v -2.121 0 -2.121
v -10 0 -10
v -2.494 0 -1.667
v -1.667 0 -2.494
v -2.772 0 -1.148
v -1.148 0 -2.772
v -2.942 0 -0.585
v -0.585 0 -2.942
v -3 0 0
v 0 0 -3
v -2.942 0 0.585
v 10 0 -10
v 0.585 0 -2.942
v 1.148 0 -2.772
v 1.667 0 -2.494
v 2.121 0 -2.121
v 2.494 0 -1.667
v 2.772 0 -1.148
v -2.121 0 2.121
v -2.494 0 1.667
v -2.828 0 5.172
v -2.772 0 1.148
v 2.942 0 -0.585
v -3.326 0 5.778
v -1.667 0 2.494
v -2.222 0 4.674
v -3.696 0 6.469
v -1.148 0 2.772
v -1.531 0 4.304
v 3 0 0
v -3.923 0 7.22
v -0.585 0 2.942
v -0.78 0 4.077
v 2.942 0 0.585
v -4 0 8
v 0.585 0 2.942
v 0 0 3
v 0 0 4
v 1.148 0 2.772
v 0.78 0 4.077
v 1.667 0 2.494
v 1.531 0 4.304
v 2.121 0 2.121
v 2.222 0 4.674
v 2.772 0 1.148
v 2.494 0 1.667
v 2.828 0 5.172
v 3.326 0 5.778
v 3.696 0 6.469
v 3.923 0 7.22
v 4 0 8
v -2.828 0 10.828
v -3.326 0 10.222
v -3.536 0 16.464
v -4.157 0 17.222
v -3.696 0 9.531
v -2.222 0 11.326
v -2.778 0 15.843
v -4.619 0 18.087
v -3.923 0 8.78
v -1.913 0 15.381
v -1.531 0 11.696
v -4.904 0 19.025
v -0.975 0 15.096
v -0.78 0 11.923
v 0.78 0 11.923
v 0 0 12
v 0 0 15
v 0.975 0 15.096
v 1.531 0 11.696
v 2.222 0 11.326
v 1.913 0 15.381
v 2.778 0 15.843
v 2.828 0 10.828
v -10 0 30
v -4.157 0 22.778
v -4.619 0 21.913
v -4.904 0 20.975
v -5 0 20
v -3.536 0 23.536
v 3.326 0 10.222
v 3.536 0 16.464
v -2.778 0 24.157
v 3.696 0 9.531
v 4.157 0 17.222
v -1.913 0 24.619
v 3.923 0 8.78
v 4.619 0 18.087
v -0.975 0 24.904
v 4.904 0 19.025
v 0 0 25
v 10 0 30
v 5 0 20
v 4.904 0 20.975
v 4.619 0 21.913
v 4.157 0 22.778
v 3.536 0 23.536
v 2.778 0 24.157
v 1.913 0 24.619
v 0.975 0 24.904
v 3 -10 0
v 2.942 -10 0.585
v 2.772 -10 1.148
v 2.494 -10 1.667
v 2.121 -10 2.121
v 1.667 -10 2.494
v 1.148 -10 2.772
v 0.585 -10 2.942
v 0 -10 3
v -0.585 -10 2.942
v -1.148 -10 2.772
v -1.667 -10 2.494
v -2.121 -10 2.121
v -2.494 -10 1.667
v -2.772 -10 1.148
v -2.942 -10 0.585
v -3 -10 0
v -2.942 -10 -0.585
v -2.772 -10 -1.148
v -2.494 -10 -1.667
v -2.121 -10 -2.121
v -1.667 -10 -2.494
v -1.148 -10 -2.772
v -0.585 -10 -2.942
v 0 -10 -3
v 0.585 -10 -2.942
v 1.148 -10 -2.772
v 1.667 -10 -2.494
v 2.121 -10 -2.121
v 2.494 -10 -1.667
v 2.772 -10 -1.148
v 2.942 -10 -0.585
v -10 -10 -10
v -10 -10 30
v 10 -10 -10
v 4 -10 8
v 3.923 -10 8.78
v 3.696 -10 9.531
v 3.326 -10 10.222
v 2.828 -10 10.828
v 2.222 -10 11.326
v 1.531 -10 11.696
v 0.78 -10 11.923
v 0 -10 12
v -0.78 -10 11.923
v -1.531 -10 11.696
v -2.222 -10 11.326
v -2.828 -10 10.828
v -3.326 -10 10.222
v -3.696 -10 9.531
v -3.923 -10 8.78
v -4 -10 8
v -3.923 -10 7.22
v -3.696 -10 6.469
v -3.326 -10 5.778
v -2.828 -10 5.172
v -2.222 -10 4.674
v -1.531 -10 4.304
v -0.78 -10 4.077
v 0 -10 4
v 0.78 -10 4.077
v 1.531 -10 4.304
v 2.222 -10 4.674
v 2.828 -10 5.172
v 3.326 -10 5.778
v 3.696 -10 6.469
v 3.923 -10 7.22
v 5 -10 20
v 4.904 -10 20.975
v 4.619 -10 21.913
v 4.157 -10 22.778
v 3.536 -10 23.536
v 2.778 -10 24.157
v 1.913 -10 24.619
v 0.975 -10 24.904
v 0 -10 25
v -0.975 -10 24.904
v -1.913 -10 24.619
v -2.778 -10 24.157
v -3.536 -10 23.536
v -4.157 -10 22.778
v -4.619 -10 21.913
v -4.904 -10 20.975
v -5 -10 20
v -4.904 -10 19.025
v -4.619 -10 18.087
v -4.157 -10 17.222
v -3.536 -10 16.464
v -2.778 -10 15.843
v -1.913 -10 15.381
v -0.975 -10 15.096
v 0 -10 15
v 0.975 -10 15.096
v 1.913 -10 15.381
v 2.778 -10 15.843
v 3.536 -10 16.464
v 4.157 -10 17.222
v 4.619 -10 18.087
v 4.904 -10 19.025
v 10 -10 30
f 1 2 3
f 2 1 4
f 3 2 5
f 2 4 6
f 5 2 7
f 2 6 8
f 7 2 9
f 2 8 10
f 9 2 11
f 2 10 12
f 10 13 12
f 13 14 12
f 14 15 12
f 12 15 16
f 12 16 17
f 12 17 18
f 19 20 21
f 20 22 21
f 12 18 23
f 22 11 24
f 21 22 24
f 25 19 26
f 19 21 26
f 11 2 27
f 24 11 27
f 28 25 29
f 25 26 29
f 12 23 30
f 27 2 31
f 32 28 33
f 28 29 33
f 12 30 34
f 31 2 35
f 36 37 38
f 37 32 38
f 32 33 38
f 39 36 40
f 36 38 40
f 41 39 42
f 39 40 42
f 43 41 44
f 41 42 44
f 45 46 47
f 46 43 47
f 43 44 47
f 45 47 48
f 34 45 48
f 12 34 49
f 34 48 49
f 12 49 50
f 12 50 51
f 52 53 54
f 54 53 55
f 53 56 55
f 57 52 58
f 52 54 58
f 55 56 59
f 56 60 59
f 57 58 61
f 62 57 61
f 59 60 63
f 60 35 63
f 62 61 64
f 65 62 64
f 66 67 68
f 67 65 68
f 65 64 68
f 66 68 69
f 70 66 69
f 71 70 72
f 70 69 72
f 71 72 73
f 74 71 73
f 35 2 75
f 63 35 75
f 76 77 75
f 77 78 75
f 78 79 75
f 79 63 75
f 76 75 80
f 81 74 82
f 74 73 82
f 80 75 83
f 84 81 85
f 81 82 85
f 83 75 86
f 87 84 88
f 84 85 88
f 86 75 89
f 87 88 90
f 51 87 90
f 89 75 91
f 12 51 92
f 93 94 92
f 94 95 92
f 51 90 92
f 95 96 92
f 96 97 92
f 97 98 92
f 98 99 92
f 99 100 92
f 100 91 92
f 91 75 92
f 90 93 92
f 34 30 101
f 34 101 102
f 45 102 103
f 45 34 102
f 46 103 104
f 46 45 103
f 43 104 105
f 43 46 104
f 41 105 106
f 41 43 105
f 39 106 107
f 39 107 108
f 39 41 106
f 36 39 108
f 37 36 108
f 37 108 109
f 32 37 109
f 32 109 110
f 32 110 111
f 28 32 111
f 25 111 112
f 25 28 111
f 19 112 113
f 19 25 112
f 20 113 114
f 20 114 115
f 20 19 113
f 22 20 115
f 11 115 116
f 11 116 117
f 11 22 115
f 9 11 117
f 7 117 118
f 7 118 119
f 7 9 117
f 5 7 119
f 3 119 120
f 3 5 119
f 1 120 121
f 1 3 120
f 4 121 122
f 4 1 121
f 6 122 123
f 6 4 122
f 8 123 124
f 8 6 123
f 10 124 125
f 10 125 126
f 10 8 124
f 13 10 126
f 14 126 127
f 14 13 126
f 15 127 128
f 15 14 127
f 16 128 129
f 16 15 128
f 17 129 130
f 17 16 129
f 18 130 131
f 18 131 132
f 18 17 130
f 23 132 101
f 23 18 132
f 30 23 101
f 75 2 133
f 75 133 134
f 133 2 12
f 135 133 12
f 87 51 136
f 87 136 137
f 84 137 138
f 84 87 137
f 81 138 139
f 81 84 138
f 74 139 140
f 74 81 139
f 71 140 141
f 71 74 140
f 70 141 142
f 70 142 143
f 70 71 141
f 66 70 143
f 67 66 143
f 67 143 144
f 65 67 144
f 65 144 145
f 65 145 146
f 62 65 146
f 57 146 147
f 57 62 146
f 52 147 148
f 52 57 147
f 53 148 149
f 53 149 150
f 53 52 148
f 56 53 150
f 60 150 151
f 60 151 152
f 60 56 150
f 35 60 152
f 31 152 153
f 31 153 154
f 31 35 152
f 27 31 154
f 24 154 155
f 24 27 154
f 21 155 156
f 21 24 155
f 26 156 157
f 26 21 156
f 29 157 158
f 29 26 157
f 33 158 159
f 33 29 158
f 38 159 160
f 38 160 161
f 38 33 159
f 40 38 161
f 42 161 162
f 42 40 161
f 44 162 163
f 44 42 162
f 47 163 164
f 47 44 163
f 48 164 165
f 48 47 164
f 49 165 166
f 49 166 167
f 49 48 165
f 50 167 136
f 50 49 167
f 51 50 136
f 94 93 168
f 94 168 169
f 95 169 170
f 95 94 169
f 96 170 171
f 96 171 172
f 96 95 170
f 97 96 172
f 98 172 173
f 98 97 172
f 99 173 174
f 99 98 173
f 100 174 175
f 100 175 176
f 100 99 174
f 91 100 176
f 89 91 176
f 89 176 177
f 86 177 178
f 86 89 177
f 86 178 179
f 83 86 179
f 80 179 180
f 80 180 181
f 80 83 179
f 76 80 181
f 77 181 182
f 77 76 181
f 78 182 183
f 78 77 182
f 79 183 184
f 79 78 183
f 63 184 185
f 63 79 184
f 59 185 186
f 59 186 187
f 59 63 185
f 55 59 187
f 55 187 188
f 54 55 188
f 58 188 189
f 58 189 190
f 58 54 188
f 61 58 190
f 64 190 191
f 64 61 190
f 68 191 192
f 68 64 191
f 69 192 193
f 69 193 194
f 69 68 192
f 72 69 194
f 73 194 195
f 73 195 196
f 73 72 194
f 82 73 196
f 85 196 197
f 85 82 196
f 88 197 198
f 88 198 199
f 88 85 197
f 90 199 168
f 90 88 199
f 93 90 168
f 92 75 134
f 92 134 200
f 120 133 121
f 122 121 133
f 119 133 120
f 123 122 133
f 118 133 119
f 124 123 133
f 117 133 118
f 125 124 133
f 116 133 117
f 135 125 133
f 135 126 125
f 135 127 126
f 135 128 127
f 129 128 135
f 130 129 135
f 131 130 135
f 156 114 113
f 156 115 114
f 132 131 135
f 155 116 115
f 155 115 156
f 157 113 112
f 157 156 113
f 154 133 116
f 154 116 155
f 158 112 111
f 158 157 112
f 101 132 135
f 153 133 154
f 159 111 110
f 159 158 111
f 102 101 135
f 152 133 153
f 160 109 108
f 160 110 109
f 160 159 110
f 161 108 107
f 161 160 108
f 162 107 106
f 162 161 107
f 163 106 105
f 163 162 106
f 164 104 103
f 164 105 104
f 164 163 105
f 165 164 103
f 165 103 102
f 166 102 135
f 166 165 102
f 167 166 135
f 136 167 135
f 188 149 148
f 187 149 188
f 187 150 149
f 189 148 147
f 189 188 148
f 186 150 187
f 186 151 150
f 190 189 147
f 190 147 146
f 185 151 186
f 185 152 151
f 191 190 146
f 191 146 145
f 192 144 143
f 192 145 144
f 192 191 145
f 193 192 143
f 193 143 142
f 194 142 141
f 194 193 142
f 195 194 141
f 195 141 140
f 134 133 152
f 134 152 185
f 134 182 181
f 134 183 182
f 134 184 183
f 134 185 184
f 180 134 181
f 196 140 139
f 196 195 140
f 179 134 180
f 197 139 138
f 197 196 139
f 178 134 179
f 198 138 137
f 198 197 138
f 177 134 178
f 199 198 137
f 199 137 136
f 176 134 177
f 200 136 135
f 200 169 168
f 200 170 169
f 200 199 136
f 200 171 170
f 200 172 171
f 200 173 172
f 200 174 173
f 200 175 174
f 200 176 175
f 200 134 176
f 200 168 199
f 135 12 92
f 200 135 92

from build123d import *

# Parameters (mm, degrees)
F0_W     = 20
F0_H     = 40
F0_R     = 3
F0_R_2   = 4
F0_R_3   = 5
F1_DEPTH = 10


with BuildPart() as f1:
    # F0 (on Front) → F1 (new body)
    with BuildSketch(Plane.XZ):
        with Locations((0, 10)):
            Rectangle(F0_W, F0_H)
        Circle(F0_R, mode=Mode.SUBTRACT)
        with Locations((0, 8)):
            Circle(F0_R_2, mode=Mode.SUBTRACT)
        with Locations((0, 20)):
            Circle(F0_R_3, mode=Mode.SUBTRACT)
    extrude(amount=F1_DEPTH)


solid = f1.part
